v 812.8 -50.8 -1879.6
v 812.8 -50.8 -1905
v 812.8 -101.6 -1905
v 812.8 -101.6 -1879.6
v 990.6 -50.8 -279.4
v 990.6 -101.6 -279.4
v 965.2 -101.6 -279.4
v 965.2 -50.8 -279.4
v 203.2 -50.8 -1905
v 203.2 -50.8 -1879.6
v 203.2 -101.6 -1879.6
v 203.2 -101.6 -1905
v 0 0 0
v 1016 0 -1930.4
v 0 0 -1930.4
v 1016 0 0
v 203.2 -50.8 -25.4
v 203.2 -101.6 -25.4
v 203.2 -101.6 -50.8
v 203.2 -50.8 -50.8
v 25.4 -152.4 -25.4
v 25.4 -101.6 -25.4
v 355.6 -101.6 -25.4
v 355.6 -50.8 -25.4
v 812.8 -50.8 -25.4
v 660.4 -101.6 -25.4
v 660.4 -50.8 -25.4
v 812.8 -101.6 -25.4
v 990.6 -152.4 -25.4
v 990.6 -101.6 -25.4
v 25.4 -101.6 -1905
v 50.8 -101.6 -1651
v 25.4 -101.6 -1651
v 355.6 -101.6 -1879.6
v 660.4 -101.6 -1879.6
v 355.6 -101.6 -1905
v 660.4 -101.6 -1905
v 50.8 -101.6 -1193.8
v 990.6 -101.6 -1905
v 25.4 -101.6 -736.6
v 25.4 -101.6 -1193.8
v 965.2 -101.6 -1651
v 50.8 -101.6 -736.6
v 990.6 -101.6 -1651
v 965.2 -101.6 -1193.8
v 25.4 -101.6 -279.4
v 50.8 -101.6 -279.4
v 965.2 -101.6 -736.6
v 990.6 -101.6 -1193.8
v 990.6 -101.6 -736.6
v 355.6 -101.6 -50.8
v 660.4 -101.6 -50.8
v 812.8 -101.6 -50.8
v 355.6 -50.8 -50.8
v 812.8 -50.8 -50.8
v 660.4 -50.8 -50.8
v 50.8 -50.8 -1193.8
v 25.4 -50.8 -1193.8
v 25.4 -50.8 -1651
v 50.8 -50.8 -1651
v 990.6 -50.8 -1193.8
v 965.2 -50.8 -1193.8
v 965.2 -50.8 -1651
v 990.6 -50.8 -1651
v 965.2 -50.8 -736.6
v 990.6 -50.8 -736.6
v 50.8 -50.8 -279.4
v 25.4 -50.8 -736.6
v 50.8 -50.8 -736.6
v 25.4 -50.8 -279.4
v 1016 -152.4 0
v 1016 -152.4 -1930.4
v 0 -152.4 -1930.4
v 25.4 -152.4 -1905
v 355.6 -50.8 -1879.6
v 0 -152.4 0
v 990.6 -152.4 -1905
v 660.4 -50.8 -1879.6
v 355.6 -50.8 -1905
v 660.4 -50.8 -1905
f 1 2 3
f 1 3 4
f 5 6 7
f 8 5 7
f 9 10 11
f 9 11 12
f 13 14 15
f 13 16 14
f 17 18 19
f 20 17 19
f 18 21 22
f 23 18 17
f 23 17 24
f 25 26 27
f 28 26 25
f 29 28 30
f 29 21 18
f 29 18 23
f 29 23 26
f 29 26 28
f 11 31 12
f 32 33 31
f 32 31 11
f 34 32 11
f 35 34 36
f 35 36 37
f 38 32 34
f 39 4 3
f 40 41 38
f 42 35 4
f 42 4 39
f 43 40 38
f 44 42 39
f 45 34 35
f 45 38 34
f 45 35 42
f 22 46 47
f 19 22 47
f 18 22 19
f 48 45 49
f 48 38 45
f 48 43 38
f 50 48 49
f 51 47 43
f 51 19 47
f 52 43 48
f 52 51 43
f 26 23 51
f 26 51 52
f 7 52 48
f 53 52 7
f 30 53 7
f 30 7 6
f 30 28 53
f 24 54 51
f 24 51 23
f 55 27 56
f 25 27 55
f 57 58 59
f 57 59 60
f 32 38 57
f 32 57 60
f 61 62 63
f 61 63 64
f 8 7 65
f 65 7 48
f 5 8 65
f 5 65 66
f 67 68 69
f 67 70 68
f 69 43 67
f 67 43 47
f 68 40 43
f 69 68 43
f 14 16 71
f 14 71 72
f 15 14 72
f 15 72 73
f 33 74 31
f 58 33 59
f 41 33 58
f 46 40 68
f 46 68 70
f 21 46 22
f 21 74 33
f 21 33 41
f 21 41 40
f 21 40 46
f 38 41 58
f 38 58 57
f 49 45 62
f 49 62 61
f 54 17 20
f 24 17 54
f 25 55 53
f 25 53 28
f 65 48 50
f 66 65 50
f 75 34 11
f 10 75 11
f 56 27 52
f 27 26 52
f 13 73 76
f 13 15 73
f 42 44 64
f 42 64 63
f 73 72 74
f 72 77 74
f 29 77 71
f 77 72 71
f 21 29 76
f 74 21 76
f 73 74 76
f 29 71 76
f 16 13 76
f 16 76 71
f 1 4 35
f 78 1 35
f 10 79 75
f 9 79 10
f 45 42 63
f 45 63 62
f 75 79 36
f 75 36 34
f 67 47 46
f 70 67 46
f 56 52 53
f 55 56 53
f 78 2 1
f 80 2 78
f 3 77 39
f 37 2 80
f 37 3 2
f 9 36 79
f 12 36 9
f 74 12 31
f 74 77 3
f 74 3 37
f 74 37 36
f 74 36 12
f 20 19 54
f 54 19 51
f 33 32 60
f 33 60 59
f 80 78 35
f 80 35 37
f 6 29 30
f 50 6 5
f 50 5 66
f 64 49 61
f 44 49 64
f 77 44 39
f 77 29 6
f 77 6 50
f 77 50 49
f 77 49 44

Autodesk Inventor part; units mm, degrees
ref_plane "YZ Plane" through (0, 0, 0) normal (1, 0, 0) x (0, 1, 0)
ref_plane "XZ Plane" through (0, 0, 0) normal (0, 1, 0) x (-1, 0, 0)
ref_plane "XY Plane" through (0, 0, 0) normal (0, 0, 1) x (1, 0, 0)
sketch "Sketch1" plane through (0, 0, 0) normal (0, 1, 0) x (-1, 0, 0)
  line L0 (0, 0) -> (-1016, 0)
  line L1 (-1016, 0) -> (-1016, -1930.4)
  line L2 (-1016, -1930.4) -> (0, -1930.4)
  line L3 (0, -1930.4) -> (0, 0)
  dimension "d0" = 1016
  dimension "d1" = 1930.4
extrude "Extrusion1" add sketch "Sketch1" against normal blind 152.4
sketch "Sketch2" plane through (0, -152.4, 0) normal (0, -1, 0) x (1, 0, 0)
  line L0 (25.4, -25.4) -> (990.6, -25.4)
  line L1 (990.6, -25.4) -> (990.6, -1905)
  line L2 (990.6, -1905) -> (25.4, -1905)
  line L3 (25.4, -1905) -> (25.4, -25.4)
  line L4 (25.4, -965.2) -> (0, -965.2)
  line L5 (0, 0) -> (0, -1930.4) projected
  line L6 (508, -1905) -> (508, -1930.4)
  line L7 (0, -1930.4) -> (1016, -1930.4) projected
  line L8 (990.6, -965.2) -> (1016, -965.2)
  line L9 (1016, -1930.4) -> (1016, 0) projected
  line L10 (508, -25.4) -> (508, 0)
  line L11 (1016, 0) -> (0, 0) projected
  dimension "d4" = 25.4
  dimension "d5" = 25.4
extrude "Extrusion2" cut sketch "Sketch2" against normal blind 50.8 contours L0 L1 L2 L3
sketch "Sketch3" plane through (0, -101.6, 0) normal (0, -1, 0) x (1, 0, 0)
  line L0 (990.6, -25.4) -> (990.6, -1905) projected
  line L1 (990.6, -279.4) -> (965.2, -279.4)
  line L2 (965.2, -279.4) -> (965.2, -736.6)
  line L3 (965.2, -736.6) -> (990.6, -736.6)
  line L4 (990.6, -736.6) -> (990.6, -279.4)
  line L5 (25.4, -1905) -> (25.4, -25.4) projected
  line L6 (990.6, -1905) -> (25.4, -1905) projected
  line L7 (990.6, -25.4) -> (990.6, -1905) projected
  line L8 (25.4, -25.4) -> (990.6, -25.4) projected
  line L9 (990.6, -1651) -> (965.2, -1651)
  line L10 (965.2, -1651) -> (965.2, -1193.8)
  line L11 (965.2, -1193.8) -> (990.6, -1193.8)
  line L12 (990.6, -1193.8) -> (990.6, -1651)
  point P0 (0, 0)
  dimension "d8" = 25.4
  dimension "d9" = 457.2
  dimension "d10" = 254
  dimension "d11" = 25.4
  dimension "d12" = 457.2
  dimension "d13" = 254
extrude "Extrusion3" cut sketch "Sketch3" against normal blind 50.8 contours L0 L3 L2 L1 | L0 L9 L10 L11
ref_plane "Work Plane1" through (508, 0, 0) normal (1, 0, 0) x (0, 0, -1)
mirror "Mirror1" about plane through (508, 0, 0) normal (1, 0, 0) of "Extrusion3"
sketch "Sketch4" plane through (0, -101.6, 0) normal (0, -1, 0) x (1, 0, 0)
  line L0 (25.4, -25.4) -> (990.6, -25.4) projected
  line L1 (812.8, -25.4) -> (660.4, -25.4)
  line L2 (660.4, -25.4) -> (660.4, -50.8)
  line L3 (660.4, -50.8) -> (812.8, -50.8)
  line L4 (812.8, -50.8) -> (812.8, -25.4)
  line L5 (355.6, -25.4) -> (203.2, -25.4)
  line L6 (203.2, -25.4) -> (203.2, -50.8)
  line L7 (203.2, -50.8) -> (355.6, -50.8)
  line L8 (355.6, -50.8) -> (355.6, -25.4)
  line L9 (990.6, -25.4) -> (990.6, -1905) projected
  line L10 (25.4, -1905) -> (25.4, -25.4) projected
  point P0 (0, 0)
  dimension "d16" = 152.4
  dimension "d17" = 25.4
  dimension "d18" = 152.4
  dimension "d19" = 25.4
  dimension "d20" = 177.8
  dimension "d21" = 177.8
extrude "Extrusion4" cut sketch "Sketch4" against normal blind 50.8
ref_plane "Work Plane2" through (0, 0, -965.2) normal (0, 0, 1) x (1, 0, 0)
mirror "Mirror2" about plane through (0, 0, -965.2) normal (0, 0, 1) of "Extrusion4"
properties part number "rev1 top"
